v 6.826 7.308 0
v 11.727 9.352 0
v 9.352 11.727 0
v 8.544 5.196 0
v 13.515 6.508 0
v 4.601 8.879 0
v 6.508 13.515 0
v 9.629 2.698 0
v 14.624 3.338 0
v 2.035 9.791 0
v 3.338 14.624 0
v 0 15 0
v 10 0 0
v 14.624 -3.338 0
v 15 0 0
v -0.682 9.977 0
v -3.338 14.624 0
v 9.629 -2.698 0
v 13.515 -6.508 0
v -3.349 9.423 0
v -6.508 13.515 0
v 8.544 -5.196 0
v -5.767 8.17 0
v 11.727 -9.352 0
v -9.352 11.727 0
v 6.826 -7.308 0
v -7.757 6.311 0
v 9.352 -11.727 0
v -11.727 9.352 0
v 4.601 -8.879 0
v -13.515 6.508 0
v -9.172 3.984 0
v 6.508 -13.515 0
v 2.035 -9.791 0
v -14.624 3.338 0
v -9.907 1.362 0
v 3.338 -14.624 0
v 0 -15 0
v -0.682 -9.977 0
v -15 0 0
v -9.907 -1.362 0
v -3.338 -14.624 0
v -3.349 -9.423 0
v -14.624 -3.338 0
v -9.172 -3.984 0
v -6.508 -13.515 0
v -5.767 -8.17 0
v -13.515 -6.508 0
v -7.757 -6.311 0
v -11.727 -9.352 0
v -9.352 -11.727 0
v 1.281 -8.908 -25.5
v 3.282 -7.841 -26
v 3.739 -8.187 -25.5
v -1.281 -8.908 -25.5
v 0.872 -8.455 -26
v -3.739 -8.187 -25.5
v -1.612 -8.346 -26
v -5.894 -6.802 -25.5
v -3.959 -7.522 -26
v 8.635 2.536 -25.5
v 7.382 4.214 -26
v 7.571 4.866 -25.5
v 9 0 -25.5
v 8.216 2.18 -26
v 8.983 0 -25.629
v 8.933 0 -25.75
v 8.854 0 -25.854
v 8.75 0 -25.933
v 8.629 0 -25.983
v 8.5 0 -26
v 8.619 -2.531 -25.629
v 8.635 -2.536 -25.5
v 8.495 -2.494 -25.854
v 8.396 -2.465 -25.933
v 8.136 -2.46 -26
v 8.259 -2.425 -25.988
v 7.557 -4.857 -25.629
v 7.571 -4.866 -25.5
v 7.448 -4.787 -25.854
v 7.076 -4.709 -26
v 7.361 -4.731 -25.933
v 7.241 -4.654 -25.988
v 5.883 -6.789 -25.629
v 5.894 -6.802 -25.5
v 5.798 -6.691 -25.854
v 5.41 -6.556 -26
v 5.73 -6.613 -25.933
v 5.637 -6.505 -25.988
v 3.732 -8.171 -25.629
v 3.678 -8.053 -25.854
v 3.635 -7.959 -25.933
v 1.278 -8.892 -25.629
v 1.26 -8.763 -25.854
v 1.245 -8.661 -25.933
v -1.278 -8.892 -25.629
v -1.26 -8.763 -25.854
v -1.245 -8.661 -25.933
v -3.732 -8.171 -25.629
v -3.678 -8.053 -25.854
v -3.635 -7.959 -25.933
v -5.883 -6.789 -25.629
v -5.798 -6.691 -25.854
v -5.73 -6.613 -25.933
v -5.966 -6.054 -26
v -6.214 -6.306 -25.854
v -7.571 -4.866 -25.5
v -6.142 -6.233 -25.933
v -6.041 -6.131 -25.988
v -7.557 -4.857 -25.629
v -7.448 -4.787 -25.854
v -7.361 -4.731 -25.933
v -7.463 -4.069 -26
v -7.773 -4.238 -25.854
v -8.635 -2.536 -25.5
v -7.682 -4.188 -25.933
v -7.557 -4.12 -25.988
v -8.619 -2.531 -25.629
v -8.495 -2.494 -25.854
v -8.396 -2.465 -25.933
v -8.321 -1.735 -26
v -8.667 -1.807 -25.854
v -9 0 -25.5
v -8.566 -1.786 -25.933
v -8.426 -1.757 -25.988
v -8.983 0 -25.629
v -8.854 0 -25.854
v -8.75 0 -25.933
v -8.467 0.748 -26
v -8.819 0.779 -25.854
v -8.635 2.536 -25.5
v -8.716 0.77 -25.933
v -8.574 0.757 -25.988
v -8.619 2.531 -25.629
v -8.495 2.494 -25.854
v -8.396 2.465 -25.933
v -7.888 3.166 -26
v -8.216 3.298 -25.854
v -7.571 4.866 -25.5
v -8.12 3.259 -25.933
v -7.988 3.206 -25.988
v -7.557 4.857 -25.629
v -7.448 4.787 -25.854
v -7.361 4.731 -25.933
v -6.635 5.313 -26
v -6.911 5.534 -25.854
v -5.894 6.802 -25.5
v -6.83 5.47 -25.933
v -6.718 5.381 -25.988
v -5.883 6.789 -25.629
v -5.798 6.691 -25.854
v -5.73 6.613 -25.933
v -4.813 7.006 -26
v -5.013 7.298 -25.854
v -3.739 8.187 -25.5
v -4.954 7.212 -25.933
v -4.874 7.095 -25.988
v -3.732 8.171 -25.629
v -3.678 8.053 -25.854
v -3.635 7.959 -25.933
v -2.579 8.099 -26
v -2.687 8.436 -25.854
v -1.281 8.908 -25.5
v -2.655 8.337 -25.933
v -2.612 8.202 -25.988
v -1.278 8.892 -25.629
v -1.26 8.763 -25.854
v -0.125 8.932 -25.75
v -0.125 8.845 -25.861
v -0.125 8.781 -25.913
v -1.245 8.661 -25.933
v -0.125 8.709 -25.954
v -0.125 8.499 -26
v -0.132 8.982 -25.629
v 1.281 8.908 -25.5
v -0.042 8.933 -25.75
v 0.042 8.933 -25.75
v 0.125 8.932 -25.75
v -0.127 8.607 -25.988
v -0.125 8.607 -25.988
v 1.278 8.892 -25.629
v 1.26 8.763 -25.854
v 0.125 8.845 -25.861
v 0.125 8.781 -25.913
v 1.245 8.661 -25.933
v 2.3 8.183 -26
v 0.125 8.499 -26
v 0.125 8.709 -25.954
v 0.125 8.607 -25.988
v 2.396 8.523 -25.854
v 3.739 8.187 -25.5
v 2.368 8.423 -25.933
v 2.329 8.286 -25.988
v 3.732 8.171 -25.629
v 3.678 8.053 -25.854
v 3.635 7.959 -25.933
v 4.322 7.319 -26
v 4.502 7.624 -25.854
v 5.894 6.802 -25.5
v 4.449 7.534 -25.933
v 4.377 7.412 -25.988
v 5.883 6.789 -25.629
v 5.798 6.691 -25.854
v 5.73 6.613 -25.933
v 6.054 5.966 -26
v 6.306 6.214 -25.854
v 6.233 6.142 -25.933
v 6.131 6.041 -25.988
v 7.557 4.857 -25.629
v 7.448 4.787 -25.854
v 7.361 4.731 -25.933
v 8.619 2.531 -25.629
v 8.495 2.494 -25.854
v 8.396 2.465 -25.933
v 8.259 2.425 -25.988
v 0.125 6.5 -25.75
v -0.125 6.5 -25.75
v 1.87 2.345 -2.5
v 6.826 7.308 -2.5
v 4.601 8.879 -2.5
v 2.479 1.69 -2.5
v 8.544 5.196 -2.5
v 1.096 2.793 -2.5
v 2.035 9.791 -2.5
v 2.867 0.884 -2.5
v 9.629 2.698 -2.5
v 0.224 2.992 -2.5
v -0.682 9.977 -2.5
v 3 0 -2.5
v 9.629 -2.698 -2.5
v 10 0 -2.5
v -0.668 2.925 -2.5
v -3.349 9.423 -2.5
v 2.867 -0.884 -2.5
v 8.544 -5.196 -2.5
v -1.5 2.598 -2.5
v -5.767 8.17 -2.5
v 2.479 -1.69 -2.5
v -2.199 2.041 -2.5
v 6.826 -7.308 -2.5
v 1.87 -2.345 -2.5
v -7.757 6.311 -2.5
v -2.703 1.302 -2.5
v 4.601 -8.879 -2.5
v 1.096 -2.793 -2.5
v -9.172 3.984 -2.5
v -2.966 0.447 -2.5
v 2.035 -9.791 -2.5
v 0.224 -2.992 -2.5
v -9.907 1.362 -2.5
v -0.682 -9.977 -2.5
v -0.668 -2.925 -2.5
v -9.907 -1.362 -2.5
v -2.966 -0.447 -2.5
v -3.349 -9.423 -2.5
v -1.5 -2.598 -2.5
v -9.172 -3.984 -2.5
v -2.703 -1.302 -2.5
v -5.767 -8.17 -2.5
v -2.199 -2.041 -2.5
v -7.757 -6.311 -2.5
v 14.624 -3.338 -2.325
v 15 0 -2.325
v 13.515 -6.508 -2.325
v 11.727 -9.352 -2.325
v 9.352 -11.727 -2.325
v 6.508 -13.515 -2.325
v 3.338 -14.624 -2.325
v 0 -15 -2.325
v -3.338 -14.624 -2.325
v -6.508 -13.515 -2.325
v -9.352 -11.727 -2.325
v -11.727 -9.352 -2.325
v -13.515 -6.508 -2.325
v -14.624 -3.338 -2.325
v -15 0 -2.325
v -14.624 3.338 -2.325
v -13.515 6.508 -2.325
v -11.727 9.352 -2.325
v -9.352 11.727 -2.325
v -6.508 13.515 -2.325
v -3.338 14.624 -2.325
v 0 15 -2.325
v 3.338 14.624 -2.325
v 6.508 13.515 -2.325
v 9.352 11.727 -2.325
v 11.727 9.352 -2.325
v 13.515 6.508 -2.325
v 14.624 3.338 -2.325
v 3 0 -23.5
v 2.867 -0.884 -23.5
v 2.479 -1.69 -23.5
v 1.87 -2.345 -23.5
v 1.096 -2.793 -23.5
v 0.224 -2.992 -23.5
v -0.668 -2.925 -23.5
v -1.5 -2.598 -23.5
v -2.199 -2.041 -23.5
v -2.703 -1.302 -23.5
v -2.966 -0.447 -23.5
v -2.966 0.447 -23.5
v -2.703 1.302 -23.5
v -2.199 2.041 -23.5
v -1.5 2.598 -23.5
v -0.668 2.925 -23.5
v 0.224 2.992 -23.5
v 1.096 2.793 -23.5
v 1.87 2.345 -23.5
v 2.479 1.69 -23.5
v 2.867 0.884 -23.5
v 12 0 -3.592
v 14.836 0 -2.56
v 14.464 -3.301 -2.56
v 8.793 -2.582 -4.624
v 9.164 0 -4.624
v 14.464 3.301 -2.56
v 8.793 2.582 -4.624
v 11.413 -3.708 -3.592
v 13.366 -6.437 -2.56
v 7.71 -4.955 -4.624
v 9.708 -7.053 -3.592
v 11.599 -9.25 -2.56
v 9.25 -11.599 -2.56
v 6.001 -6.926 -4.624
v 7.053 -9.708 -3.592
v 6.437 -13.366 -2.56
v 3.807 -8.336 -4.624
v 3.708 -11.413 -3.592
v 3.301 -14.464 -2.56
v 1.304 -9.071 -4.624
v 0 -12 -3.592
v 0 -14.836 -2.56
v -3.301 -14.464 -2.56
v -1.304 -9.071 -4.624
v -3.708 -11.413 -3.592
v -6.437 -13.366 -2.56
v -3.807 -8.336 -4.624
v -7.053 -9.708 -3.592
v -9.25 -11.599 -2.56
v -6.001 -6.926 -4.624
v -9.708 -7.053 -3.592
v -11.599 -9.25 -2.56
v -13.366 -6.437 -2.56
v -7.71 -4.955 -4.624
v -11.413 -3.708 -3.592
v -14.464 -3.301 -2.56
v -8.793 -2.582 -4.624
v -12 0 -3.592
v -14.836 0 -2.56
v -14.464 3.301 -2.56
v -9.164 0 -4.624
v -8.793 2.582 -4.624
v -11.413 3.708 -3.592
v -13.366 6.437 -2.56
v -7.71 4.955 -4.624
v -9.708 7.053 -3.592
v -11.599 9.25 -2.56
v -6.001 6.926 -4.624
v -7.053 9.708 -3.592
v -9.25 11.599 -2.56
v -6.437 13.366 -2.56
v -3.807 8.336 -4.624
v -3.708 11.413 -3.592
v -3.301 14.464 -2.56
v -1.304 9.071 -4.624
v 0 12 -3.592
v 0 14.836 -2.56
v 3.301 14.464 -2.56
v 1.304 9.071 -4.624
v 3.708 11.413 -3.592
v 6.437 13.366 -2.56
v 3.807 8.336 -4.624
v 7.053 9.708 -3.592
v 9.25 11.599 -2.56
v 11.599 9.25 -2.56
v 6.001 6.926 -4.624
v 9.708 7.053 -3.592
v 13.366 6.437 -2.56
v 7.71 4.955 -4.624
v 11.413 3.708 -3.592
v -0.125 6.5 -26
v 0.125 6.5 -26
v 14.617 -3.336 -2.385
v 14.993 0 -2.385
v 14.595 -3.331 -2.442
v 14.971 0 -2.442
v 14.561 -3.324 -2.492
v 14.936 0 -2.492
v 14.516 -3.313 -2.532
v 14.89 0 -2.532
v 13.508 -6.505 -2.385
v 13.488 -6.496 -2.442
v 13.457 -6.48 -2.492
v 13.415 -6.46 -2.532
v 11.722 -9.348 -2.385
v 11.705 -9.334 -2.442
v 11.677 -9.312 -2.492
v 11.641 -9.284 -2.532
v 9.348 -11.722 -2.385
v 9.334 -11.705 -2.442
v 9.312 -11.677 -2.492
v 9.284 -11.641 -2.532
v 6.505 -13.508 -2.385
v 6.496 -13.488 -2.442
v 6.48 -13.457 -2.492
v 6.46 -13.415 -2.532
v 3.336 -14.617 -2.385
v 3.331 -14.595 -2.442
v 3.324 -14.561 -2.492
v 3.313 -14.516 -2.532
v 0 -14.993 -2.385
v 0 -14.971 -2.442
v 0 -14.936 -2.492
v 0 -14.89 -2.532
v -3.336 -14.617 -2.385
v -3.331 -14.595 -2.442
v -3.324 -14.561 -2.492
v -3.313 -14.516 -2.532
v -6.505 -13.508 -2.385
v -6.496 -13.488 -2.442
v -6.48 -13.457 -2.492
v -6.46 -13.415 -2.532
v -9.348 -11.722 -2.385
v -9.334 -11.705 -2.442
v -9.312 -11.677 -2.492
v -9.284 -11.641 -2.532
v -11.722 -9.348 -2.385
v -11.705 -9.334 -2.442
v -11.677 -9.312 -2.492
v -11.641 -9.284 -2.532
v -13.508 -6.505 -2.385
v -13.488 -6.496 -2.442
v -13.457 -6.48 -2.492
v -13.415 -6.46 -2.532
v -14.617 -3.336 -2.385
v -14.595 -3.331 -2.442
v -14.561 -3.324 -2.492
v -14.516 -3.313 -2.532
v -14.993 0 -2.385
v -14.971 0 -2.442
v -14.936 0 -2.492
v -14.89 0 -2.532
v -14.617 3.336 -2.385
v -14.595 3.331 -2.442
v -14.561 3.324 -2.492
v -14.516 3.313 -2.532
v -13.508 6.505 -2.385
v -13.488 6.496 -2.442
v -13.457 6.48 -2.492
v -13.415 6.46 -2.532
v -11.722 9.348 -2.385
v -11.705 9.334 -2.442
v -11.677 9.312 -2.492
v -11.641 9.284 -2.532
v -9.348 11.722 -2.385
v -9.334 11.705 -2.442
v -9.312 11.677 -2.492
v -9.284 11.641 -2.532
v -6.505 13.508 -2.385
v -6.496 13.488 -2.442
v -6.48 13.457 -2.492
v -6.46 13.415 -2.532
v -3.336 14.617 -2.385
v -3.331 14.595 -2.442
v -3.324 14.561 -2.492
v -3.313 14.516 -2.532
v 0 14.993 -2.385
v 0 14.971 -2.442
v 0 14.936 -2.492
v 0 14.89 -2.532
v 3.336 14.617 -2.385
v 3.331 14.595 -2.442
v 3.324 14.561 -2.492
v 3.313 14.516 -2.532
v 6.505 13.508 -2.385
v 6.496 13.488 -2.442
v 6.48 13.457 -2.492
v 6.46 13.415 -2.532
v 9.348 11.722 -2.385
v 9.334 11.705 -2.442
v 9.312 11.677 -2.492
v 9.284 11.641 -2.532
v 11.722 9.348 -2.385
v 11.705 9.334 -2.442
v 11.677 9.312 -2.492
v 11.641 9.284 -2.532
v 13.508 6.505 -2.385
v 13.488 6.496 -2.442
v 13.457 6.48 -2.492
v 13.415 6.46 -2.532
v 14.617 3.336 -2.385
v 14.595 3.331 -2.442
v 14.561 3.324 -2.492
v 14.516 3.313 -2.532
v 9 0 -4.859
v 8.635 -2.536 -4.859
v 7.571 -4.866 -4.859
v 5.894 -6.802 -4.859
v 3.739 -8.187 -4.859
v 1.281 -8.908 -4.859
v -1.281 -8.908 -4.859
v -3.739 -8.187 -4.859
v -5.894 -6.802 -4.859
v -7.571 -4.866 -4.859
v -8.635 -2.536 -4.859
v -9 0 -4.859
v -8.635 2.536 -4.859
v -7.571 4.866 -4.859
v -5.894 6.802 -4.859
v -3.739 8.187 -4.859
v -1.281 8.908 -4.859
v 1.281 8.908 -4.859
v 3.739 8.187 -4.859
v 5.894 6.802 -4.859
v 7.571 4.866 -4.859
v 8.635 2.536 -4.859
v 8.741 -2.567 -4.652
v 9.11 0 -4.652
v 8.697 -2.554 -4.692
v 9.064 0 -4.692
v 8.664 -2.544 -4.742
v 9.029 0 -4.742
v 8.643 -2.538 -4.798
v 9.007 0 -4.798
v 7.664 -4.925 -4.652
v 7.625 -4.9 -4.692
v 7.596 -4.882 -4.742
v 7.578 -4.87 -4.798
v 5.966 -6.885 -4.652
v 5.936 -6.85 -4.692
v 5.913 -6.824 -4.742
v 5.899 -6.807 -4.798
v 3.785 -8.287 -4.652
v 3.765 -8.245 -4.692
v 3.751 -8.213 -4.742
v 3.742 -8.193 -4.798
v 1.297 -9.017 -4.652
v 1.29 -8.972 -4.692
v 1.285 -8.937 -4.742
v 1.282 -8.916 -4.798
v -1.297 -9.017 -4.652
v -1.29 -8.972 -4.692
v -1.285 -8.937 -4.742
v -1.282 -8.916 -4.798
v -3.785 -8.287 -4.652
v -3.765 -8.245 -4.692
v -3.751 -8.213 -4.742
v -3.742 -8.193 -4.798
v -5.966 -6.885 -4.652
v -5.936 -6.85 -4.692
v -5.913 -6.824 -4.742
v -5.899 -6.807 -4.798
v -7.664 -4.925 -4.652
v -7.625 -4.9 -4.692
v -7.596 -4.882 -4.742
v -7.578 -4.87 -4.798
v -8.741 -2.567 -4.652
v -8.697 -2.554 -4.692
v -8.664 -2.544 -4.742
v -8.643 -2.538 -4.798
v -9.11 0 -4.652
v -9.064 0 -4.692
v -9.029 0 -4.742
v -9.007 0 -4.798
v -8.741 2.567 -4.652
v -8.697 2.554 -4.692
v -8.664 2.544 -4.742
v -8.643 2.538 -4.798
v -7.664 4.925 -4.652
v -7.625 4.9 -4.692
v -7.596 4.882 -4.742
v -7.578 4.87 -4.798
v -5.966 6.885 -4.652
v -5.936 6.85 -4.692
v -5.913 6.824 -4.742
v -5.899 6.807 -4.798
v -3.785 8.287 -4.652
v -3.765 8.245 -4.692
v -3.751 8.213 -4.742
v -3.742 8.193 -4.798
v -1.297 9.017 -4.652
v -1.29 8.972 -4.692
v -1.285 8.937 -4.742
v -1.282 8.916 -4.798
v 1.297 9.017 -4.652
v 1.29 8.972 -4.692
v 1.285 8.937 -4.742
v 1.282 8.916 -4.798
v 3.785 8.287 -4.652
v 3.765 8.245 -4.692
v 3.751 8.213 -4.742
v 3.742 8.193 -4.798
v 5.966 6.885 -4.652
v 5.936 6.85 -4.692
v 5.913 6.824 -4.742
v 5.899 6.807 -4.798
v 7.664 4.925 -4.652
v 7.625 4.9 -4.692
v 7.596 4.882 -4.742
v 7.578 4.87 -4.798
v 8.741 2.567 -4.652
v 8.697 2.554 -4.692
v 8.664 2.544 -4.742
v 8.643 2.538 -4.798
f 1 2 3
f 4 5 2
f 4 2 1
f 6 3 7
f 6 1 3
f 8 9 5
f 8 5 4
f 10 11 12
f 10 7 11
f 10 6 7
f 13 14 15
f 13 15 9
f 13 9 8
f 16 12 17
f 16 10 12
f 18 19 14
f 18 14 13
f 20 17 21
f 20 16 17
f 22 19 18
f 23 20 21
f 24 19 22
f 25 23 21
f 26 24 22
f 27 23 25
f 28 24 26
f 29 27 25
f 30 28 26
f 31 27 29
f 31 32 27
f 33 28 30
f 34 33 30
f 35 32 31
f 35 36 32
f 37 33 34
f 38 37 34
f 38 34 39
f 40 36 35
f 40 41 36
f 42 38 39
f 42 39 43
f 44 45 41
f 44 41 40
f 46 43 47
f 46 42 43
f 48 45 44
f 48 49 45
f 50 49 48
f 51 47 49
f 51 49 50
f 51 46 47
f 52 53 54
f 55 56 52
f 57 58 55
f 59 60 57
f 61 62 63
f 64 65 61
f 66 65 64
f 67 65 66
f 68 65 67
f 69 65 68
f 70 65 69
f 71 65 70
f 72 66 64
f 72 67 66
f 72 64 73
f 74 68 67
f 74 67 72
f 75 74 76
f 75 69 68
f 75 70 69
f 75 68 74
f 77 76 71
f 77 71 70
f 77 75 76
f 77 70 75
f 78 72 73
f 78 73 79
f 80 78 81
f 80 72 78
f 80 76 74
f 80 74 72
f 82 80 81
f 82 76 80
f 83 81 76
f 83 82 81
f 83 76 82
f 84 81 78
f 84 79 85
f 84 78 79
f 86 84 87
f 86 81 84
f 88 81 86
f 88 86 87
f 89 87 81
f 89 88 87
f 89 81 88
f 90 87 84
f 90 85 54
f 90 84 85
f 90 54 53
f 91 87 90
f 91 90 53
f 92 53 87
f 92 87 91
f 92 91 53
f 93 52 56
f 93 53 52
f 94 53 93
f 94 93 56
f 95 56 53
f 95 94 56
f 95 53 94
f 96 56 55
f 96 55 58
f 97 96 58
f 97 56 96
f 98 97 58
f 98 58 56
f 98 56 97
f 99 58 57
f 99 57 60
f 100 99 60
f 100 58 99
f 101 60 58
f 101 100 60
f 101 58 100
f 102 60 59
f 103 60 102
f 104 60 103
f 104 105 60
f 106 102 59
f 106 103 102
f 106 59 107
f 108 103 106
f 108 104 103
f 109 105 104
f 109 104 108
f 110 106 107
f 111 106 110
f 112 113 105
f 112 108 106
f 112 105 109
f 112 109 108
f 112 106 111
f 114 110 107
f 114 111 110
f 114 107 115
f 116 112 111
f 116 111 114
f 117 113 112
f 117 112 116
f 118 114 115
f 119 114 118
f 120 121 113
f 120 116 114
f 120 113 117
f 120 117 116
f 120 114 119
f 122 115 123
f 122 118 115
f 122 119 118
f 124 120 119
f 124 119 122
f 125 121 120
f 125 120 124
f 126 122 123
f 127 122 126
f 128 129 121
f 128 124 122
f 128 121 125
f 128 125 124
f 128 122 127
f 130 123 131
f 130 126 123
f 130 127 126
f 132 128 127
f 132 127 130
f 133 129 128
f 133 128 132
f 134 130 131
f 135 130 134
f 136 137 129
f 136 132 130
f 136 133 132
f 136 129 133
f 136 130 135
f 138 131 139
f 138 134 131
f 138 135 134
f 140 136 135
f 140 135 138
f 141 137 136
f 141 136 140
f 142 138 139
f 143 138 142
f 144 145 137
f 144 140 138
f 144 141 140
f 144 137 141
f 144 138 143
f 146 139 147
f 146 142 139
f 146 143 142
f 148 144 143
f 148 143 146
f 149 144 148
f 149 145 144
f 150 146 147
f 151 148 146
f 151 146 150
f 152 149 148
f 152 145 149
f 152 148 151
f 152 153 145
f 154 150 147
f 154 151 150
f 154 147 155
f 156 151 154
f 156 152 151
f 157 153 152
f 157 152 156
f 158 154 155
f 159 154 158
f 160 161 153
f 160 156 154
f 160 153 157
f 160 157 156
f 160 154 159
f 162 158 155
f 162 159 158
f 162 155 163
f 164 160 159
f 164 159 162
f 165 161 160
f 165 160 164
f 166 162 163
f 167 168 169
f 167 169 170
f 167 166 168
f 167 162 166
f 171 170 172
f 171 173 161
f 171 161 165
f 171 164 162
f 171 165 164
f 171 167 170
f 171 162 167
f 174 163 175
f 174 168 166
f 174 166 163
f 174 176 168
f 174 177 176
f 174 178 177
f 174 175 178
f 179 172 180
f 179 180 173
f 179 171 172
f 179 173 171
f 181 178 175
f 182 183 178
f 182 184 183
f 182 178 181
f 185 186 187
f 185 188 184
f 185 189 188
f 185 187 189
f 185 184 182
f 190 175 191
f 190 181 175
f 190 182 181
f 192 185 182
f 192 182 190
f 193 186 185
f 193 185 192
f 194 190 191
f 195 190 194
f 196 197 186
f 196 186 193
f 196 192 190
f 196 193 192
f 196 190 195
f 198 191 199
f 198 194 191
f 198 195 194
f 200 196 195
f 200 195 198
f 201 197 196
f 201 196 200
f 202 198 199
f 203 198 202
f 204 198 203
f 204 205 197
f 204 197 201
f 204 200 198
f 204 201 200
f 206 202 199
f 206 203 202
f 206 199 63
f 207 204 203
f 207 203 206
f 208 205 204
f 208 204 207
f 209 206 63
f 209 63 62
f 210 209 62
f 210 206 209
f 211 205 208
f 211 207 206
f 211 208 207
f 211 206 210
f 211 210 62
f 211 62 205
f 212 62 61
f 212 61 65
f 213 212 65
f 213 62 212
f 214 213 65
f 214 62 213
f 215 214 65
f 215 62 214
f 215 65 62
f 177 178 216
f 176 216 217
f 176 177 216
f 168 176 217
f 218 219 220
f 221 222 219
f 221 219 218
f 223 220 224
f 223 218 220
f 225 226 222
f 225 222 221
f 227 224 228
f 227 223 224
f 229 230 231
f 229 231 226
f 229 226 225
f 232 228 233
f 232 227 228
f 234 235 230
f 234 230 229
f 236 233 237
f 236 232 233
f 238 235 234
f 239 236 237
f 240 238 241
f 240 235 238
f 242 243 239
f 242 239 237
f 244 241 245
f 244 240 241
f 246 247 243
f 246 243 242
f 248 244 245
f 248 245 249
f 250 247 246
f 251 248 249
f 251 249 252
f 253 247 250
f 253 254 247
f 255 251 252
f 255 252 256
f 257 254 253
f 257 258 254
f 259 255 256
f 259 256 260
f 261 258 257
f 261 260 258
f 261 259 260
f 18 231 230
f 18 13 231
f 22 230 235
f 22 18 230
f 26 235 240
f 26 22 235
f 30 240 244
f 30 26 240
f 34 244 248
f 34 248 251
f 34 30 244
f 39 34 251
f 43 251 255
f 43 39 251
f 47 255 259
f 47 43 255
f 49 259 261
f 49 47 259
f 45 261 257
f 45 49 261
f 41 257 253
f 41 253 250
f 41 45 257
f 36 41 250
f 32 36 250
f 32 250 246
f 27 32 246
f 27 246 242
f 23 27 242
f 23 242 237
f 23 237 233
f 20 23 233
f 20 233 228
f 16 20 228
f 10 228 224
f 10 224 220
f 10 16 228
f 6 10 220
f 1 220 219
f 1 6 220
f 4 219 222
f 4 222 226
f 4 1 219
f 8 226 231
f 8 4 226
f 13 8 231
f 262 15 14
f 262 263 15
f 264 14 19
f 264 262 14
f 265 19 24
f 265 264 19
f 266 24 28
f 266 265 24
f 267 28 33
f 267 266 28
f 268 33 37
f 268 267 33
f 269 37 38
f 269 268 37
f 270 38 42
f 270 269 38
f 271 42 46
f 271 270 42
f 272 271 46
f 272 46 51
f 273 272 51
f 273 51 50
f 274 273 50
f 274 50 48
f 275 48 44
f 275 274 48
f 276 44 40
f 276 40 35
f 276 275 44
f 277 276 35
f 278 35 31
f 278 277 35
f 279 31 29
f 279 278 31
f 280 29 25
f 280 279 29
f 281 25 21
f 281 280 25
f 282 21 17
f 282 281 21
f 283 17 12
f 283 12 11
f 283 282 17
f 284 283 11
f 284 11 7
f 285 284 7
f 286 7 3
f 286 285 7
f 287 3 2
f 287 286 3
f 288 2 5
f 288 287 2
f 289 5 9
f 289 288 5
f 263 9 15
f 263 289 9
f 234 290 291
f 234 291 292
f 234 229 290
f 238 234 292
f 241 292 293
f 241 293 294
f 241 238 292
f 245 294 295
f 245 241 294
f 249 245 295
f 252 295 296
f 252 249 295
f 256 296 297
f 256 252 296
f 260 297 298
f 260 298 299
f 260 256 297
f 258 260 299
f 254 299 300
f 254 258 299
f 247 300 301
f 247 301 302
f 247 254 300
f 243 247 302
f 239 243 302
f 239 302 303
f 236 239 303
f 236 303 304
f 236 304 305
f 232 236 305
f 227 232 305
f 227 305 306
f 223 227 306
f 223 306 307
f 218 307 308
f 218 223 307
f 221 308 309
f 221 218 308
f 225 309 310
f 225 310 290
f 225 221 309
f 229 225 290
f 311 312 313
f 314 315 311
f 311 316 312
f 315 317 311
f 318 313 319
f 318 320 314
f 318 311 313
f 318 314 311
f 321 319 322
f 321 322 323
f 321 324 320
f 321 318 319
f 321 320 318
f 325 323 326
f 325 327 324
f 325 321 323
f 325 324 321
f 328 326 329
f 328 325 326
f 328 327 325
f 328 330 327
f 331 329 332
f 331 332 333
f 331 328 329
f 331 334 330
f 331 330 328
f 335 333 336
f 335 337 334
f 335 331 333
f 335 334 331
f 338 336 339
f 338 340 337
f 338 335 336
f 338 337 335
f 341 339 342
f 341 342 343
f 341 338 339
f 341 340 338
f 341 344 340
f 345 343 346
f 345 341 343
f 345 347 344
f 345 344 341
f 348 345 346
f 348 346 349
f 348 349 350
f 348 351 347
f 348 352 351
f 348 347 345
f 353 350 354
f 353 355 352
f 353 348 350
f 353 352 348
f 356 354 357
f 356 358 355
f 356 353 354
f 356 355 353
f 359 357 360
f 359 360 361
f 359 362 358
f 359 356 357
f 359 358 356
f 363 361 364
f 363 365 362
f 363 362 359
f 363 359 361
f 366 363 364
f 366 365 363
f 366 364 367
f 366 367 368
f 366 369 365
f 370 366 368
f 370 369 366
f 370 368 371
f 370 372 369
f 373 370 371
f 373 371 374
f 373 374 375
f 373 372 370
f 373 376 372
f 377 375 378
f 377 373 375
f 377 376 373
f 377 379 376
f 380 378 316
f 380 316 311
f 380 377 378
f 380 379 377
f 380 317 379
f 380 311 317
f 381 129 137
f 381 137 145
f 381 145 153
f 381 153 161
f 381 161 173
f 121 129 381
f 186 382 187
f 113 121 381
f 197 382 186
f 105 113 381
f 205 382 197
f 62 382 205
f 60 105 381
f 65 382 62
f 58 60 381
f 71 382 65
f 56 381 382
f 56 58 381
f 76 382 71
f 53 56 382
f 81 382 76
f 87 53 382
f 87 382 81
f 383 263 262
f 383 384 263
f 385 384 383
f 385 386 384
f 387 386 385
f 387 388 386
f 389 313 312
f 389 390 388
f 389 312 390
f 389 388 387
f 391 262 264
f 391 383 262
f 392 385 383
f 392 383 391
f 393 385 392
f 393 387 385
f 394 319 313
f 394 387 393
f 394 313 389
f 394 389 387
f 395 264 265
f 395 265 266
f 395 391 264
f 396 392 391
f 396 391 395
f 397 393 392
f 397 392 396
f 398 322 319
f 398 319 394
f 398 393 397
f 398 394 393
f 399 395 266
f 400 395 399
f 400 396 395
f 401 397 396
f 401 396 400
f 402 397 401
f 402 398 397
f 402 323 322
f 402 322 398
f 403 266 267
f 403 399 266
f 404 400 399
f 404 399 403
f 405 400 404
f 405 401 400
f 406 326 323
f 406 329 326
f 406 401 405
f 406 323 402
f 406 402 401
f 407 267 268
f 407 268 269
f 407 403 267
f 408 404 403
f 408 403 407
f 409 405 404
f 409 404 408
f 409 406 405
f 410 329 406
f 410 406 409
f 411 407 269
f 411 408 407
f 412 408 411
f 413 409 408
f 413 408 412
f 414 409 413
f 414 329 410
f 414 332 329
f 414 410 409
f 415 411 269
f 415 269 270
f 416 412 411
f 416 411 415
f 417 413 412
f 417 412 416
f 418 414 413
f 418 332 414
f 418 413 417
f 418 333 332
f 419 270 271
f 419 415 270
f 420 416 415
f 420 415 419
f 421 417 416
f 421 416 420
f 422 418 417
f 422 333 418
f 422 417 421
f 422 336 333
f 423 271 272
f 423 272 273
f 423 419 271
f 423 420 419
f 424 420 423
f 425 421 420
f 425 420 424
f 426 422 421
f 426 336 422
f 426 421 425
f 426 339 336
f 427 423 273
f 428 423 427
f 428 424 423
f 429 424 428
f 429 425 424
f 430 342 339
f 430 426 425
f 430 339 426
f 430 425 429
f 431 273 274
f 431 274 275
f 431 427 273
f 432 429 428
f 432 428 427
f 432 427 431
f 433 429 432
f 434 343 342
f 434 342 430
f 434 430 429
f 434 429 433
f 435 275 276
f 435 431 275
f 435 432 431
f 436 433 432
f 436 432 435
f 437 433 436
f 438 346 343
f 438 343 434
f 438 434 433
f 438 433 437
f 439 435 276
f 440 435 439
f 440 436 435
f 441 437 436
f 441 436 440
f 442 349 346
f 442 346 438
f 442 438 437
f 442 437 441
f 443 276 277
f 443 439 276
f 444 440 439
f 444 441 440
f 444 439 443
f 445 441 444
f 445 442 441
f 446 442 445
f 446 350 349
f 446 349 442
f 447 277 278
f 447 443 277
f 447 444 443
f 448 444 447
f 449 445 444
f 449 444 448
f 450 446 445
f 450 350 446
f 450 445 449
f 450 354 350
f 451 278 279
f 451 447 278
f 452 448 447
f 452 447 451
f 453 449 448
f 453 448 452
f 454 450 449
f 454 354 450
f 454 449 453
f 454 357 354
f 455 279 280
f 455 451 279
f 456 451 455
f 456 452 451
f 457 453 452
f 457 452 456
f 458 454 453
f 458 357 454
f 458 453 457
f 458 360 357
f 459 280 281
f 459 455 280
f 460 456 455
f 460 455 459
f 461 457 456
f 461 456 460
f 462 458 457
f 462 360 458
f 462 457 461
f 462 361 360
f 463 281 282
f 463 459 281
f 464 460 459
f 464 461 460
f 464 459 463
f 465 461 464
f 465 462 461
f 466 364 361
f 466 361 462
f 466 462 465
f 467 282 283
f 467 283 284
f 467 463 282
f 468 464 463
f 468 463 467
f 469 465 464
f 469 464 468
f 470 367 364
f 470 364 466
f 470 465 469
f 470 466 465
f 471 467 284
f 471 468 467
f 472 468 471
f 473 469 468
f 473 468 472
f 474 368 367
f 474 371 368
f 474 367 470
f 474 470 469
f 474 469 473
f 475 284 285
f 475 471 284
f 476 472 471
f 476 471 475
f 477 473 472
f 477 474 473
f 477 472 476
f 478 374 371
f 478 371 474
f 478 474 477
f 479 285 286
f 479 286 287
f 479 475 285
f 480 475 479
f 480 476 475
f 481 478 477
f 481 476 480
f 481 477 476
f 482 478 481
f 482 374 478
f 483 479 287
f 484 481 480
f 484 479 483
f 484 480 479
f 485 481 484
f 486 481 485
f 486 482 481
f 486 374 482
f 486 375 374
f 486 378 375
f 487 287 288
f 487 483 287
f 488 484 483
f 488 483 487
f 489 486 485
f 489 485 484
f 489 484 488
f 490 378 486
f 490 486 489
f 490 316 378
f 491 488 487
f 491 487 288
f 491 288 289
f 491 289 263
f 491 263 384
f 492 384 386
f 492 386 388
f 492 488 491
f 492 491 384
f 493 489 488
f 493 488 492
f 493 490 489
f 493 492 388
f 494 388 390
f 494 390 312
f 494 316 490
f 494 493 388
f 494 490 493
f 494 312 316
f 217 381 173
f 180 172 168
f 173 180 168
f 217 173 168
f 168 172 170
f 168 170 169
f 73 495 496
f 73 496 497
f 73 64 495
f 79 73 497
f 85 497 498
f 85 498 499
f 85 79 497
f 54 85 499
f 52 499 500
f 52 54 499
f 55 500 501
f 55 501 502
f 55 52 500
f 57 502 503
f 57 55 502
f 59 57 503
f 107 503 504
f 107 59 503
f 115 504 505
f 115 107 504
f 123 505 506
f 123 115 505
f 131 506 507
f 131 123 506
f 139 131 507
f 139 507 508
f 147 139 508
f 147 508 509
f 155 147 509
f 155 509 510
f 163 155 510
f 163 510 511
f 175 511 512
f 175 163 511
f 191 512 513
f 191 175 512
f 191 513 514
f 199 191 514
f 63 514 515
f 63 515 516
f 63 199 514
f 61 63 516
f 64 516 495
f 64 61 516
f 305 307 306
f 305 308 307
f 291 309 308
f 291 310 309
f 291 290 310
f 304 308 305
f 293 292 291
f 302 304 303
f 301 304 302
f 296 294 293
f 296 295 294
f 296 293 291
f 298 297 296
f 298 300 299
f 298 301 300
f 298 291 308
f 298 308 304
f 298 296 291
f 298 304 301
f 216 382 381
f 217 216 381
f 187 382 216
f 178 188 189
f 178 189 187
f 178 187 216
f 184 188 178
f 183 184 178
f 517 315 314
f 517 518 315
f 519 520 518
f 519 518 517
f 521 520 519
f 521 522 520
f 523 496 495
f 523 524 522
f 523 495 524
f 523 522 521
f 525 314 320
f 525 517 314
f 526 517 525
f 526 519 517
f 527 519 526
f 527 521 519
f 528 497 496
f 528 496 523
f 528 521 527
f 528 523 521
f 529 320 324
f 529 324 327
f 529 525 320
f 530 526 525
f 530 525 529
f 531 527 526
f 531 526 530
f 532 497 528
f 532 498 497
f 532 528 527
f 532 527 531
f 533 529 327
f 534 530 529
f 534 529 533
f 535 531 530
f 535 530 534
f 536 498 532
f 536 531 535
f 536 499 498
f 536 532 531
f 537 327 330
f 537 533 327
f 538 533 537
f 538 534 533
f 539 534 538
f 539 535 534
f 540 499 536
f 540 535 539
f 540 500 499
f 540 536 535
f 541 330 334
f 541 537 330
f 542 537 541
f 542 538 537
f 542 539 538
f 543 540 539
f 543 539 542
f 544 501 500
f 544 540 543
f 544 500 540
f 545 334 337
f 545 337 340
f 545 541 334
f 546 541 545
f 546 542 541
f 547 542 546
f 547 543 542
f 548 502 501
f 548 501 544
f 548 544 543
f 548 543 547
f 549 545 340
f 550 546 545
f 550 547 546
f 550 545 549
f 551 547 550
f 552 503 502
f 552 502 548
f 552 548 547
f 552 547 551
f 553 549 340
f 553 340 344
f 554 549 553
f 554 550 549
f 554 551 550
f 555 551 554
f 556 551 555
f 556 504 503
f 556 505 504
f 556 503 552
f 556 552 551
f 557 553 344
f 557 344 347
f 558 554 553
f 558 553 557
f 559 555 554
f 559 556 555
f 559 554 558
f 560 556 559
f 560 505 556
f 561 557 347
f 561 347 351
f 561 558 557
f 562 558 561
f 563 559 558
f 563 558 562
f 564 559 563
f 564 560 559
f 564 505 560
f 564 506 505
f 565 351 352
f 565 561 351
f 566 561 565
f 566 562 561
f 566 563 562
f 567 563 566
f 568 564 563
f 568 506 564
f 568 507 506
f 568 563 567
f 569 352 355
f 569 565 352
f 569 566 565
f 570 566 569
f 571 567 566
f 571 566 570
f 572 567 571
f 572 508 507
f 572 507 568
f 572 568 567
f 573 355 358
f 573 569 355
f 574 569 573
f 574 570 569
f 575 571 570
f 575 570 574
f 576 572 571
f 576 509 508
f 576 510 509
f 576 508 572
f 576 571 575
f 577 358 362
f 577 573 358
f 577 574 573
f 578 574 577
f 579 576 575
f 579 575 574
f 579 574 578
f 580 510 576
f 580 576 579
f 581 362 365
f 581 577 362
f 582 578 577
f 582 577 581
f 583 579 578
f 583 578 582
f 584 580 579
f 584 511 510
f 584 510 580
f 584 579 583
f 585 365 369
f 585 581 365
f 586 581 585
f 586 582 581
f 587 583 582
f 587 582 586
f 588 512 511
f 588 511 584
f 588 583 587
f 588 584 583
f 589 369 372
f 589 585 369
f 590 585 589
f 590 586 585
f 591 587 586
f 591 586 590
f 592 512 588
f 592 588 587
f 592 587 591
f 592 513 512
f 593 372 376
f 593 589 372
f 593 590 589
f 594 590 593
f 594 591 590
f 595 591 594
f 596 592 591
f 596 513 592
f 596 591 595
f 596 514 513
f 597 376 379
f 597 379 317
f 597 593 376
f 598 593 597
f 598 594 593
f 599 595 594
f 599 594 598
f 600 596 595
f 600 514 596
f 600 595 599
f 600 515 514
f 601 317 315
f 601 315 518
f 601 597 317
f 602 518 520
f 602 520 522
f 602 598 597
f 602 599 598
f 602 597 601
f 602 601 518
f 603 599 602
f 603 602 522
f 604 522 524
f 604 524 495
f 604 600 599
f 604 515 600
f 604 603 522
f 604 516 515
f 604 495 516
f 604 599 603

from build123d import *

# Parameters (mm, degrees)
SKETCH2_W          = 0.25
SKETCH2_H          = 3
CUT_EXTRUDE1_DEPTH = 0.25


with BuildPart() as part:
    # Sketch1 → Revolve1 (revolve)
    with BuildSketch(Plane(origin=(0, 0, 0), x_dir=(0, 0, -1), z_dir=(1, 0, 0)), mode=Mode.PRIVATE) as revolve1_sk:
        with BuildLine():
            Line((0, 10), (0, 15))
            Line((0, 15), (2.324948115, 15))
            ThreePointArc((2.324948115, 15), (2.468342225, 14.954788011), (2.559871271, 14.835505036))
            Line((2.559871271, 14.835505036), (4.623950135, 9.164494964))
            ThreePointArc((4.623950135, 9.164494964), (4.715479181, 9.045211989), (4.85887329, 9))
            Line((4.85887329, 9), (25.5, 9))
            ThreePointArc((25.5, 9), (25.853553391, 8.853553391), (26, 8.5))
            Line((26, 8.5), (26, 0))
            Line((26, 0), (23.5, 0))
            Line((23.5, 0), (23.5, 3))
            Line((23.5, 3), (2.5, 3))
            Line((2.5, 3), (2.5, 10))
            Line((2.5, 10), (0, 10))
        make_face()
    revolve(revolve1_sk.sketch.rotate(Axis((0, 0, 0), (0, 0, -1)), 90), axis=Axis((0, 0, 0), (0, 0, -1)))

    # Sketch2 → Cut-Extrude1 (cut)
    with BuildSketch(Plane(origin=(0, 0, -26), x_dir=(-1, 0, 0), z_dir=(0, 0, -1))):
        with Locations((0, 8)):
            Rectangle(SKETCH2_W, SKETCH2_H)
    extrude(amount=-CUT_EXTRUDE1_DEPTH, mode=Mode.SUBTRACT)


solid = part.part
